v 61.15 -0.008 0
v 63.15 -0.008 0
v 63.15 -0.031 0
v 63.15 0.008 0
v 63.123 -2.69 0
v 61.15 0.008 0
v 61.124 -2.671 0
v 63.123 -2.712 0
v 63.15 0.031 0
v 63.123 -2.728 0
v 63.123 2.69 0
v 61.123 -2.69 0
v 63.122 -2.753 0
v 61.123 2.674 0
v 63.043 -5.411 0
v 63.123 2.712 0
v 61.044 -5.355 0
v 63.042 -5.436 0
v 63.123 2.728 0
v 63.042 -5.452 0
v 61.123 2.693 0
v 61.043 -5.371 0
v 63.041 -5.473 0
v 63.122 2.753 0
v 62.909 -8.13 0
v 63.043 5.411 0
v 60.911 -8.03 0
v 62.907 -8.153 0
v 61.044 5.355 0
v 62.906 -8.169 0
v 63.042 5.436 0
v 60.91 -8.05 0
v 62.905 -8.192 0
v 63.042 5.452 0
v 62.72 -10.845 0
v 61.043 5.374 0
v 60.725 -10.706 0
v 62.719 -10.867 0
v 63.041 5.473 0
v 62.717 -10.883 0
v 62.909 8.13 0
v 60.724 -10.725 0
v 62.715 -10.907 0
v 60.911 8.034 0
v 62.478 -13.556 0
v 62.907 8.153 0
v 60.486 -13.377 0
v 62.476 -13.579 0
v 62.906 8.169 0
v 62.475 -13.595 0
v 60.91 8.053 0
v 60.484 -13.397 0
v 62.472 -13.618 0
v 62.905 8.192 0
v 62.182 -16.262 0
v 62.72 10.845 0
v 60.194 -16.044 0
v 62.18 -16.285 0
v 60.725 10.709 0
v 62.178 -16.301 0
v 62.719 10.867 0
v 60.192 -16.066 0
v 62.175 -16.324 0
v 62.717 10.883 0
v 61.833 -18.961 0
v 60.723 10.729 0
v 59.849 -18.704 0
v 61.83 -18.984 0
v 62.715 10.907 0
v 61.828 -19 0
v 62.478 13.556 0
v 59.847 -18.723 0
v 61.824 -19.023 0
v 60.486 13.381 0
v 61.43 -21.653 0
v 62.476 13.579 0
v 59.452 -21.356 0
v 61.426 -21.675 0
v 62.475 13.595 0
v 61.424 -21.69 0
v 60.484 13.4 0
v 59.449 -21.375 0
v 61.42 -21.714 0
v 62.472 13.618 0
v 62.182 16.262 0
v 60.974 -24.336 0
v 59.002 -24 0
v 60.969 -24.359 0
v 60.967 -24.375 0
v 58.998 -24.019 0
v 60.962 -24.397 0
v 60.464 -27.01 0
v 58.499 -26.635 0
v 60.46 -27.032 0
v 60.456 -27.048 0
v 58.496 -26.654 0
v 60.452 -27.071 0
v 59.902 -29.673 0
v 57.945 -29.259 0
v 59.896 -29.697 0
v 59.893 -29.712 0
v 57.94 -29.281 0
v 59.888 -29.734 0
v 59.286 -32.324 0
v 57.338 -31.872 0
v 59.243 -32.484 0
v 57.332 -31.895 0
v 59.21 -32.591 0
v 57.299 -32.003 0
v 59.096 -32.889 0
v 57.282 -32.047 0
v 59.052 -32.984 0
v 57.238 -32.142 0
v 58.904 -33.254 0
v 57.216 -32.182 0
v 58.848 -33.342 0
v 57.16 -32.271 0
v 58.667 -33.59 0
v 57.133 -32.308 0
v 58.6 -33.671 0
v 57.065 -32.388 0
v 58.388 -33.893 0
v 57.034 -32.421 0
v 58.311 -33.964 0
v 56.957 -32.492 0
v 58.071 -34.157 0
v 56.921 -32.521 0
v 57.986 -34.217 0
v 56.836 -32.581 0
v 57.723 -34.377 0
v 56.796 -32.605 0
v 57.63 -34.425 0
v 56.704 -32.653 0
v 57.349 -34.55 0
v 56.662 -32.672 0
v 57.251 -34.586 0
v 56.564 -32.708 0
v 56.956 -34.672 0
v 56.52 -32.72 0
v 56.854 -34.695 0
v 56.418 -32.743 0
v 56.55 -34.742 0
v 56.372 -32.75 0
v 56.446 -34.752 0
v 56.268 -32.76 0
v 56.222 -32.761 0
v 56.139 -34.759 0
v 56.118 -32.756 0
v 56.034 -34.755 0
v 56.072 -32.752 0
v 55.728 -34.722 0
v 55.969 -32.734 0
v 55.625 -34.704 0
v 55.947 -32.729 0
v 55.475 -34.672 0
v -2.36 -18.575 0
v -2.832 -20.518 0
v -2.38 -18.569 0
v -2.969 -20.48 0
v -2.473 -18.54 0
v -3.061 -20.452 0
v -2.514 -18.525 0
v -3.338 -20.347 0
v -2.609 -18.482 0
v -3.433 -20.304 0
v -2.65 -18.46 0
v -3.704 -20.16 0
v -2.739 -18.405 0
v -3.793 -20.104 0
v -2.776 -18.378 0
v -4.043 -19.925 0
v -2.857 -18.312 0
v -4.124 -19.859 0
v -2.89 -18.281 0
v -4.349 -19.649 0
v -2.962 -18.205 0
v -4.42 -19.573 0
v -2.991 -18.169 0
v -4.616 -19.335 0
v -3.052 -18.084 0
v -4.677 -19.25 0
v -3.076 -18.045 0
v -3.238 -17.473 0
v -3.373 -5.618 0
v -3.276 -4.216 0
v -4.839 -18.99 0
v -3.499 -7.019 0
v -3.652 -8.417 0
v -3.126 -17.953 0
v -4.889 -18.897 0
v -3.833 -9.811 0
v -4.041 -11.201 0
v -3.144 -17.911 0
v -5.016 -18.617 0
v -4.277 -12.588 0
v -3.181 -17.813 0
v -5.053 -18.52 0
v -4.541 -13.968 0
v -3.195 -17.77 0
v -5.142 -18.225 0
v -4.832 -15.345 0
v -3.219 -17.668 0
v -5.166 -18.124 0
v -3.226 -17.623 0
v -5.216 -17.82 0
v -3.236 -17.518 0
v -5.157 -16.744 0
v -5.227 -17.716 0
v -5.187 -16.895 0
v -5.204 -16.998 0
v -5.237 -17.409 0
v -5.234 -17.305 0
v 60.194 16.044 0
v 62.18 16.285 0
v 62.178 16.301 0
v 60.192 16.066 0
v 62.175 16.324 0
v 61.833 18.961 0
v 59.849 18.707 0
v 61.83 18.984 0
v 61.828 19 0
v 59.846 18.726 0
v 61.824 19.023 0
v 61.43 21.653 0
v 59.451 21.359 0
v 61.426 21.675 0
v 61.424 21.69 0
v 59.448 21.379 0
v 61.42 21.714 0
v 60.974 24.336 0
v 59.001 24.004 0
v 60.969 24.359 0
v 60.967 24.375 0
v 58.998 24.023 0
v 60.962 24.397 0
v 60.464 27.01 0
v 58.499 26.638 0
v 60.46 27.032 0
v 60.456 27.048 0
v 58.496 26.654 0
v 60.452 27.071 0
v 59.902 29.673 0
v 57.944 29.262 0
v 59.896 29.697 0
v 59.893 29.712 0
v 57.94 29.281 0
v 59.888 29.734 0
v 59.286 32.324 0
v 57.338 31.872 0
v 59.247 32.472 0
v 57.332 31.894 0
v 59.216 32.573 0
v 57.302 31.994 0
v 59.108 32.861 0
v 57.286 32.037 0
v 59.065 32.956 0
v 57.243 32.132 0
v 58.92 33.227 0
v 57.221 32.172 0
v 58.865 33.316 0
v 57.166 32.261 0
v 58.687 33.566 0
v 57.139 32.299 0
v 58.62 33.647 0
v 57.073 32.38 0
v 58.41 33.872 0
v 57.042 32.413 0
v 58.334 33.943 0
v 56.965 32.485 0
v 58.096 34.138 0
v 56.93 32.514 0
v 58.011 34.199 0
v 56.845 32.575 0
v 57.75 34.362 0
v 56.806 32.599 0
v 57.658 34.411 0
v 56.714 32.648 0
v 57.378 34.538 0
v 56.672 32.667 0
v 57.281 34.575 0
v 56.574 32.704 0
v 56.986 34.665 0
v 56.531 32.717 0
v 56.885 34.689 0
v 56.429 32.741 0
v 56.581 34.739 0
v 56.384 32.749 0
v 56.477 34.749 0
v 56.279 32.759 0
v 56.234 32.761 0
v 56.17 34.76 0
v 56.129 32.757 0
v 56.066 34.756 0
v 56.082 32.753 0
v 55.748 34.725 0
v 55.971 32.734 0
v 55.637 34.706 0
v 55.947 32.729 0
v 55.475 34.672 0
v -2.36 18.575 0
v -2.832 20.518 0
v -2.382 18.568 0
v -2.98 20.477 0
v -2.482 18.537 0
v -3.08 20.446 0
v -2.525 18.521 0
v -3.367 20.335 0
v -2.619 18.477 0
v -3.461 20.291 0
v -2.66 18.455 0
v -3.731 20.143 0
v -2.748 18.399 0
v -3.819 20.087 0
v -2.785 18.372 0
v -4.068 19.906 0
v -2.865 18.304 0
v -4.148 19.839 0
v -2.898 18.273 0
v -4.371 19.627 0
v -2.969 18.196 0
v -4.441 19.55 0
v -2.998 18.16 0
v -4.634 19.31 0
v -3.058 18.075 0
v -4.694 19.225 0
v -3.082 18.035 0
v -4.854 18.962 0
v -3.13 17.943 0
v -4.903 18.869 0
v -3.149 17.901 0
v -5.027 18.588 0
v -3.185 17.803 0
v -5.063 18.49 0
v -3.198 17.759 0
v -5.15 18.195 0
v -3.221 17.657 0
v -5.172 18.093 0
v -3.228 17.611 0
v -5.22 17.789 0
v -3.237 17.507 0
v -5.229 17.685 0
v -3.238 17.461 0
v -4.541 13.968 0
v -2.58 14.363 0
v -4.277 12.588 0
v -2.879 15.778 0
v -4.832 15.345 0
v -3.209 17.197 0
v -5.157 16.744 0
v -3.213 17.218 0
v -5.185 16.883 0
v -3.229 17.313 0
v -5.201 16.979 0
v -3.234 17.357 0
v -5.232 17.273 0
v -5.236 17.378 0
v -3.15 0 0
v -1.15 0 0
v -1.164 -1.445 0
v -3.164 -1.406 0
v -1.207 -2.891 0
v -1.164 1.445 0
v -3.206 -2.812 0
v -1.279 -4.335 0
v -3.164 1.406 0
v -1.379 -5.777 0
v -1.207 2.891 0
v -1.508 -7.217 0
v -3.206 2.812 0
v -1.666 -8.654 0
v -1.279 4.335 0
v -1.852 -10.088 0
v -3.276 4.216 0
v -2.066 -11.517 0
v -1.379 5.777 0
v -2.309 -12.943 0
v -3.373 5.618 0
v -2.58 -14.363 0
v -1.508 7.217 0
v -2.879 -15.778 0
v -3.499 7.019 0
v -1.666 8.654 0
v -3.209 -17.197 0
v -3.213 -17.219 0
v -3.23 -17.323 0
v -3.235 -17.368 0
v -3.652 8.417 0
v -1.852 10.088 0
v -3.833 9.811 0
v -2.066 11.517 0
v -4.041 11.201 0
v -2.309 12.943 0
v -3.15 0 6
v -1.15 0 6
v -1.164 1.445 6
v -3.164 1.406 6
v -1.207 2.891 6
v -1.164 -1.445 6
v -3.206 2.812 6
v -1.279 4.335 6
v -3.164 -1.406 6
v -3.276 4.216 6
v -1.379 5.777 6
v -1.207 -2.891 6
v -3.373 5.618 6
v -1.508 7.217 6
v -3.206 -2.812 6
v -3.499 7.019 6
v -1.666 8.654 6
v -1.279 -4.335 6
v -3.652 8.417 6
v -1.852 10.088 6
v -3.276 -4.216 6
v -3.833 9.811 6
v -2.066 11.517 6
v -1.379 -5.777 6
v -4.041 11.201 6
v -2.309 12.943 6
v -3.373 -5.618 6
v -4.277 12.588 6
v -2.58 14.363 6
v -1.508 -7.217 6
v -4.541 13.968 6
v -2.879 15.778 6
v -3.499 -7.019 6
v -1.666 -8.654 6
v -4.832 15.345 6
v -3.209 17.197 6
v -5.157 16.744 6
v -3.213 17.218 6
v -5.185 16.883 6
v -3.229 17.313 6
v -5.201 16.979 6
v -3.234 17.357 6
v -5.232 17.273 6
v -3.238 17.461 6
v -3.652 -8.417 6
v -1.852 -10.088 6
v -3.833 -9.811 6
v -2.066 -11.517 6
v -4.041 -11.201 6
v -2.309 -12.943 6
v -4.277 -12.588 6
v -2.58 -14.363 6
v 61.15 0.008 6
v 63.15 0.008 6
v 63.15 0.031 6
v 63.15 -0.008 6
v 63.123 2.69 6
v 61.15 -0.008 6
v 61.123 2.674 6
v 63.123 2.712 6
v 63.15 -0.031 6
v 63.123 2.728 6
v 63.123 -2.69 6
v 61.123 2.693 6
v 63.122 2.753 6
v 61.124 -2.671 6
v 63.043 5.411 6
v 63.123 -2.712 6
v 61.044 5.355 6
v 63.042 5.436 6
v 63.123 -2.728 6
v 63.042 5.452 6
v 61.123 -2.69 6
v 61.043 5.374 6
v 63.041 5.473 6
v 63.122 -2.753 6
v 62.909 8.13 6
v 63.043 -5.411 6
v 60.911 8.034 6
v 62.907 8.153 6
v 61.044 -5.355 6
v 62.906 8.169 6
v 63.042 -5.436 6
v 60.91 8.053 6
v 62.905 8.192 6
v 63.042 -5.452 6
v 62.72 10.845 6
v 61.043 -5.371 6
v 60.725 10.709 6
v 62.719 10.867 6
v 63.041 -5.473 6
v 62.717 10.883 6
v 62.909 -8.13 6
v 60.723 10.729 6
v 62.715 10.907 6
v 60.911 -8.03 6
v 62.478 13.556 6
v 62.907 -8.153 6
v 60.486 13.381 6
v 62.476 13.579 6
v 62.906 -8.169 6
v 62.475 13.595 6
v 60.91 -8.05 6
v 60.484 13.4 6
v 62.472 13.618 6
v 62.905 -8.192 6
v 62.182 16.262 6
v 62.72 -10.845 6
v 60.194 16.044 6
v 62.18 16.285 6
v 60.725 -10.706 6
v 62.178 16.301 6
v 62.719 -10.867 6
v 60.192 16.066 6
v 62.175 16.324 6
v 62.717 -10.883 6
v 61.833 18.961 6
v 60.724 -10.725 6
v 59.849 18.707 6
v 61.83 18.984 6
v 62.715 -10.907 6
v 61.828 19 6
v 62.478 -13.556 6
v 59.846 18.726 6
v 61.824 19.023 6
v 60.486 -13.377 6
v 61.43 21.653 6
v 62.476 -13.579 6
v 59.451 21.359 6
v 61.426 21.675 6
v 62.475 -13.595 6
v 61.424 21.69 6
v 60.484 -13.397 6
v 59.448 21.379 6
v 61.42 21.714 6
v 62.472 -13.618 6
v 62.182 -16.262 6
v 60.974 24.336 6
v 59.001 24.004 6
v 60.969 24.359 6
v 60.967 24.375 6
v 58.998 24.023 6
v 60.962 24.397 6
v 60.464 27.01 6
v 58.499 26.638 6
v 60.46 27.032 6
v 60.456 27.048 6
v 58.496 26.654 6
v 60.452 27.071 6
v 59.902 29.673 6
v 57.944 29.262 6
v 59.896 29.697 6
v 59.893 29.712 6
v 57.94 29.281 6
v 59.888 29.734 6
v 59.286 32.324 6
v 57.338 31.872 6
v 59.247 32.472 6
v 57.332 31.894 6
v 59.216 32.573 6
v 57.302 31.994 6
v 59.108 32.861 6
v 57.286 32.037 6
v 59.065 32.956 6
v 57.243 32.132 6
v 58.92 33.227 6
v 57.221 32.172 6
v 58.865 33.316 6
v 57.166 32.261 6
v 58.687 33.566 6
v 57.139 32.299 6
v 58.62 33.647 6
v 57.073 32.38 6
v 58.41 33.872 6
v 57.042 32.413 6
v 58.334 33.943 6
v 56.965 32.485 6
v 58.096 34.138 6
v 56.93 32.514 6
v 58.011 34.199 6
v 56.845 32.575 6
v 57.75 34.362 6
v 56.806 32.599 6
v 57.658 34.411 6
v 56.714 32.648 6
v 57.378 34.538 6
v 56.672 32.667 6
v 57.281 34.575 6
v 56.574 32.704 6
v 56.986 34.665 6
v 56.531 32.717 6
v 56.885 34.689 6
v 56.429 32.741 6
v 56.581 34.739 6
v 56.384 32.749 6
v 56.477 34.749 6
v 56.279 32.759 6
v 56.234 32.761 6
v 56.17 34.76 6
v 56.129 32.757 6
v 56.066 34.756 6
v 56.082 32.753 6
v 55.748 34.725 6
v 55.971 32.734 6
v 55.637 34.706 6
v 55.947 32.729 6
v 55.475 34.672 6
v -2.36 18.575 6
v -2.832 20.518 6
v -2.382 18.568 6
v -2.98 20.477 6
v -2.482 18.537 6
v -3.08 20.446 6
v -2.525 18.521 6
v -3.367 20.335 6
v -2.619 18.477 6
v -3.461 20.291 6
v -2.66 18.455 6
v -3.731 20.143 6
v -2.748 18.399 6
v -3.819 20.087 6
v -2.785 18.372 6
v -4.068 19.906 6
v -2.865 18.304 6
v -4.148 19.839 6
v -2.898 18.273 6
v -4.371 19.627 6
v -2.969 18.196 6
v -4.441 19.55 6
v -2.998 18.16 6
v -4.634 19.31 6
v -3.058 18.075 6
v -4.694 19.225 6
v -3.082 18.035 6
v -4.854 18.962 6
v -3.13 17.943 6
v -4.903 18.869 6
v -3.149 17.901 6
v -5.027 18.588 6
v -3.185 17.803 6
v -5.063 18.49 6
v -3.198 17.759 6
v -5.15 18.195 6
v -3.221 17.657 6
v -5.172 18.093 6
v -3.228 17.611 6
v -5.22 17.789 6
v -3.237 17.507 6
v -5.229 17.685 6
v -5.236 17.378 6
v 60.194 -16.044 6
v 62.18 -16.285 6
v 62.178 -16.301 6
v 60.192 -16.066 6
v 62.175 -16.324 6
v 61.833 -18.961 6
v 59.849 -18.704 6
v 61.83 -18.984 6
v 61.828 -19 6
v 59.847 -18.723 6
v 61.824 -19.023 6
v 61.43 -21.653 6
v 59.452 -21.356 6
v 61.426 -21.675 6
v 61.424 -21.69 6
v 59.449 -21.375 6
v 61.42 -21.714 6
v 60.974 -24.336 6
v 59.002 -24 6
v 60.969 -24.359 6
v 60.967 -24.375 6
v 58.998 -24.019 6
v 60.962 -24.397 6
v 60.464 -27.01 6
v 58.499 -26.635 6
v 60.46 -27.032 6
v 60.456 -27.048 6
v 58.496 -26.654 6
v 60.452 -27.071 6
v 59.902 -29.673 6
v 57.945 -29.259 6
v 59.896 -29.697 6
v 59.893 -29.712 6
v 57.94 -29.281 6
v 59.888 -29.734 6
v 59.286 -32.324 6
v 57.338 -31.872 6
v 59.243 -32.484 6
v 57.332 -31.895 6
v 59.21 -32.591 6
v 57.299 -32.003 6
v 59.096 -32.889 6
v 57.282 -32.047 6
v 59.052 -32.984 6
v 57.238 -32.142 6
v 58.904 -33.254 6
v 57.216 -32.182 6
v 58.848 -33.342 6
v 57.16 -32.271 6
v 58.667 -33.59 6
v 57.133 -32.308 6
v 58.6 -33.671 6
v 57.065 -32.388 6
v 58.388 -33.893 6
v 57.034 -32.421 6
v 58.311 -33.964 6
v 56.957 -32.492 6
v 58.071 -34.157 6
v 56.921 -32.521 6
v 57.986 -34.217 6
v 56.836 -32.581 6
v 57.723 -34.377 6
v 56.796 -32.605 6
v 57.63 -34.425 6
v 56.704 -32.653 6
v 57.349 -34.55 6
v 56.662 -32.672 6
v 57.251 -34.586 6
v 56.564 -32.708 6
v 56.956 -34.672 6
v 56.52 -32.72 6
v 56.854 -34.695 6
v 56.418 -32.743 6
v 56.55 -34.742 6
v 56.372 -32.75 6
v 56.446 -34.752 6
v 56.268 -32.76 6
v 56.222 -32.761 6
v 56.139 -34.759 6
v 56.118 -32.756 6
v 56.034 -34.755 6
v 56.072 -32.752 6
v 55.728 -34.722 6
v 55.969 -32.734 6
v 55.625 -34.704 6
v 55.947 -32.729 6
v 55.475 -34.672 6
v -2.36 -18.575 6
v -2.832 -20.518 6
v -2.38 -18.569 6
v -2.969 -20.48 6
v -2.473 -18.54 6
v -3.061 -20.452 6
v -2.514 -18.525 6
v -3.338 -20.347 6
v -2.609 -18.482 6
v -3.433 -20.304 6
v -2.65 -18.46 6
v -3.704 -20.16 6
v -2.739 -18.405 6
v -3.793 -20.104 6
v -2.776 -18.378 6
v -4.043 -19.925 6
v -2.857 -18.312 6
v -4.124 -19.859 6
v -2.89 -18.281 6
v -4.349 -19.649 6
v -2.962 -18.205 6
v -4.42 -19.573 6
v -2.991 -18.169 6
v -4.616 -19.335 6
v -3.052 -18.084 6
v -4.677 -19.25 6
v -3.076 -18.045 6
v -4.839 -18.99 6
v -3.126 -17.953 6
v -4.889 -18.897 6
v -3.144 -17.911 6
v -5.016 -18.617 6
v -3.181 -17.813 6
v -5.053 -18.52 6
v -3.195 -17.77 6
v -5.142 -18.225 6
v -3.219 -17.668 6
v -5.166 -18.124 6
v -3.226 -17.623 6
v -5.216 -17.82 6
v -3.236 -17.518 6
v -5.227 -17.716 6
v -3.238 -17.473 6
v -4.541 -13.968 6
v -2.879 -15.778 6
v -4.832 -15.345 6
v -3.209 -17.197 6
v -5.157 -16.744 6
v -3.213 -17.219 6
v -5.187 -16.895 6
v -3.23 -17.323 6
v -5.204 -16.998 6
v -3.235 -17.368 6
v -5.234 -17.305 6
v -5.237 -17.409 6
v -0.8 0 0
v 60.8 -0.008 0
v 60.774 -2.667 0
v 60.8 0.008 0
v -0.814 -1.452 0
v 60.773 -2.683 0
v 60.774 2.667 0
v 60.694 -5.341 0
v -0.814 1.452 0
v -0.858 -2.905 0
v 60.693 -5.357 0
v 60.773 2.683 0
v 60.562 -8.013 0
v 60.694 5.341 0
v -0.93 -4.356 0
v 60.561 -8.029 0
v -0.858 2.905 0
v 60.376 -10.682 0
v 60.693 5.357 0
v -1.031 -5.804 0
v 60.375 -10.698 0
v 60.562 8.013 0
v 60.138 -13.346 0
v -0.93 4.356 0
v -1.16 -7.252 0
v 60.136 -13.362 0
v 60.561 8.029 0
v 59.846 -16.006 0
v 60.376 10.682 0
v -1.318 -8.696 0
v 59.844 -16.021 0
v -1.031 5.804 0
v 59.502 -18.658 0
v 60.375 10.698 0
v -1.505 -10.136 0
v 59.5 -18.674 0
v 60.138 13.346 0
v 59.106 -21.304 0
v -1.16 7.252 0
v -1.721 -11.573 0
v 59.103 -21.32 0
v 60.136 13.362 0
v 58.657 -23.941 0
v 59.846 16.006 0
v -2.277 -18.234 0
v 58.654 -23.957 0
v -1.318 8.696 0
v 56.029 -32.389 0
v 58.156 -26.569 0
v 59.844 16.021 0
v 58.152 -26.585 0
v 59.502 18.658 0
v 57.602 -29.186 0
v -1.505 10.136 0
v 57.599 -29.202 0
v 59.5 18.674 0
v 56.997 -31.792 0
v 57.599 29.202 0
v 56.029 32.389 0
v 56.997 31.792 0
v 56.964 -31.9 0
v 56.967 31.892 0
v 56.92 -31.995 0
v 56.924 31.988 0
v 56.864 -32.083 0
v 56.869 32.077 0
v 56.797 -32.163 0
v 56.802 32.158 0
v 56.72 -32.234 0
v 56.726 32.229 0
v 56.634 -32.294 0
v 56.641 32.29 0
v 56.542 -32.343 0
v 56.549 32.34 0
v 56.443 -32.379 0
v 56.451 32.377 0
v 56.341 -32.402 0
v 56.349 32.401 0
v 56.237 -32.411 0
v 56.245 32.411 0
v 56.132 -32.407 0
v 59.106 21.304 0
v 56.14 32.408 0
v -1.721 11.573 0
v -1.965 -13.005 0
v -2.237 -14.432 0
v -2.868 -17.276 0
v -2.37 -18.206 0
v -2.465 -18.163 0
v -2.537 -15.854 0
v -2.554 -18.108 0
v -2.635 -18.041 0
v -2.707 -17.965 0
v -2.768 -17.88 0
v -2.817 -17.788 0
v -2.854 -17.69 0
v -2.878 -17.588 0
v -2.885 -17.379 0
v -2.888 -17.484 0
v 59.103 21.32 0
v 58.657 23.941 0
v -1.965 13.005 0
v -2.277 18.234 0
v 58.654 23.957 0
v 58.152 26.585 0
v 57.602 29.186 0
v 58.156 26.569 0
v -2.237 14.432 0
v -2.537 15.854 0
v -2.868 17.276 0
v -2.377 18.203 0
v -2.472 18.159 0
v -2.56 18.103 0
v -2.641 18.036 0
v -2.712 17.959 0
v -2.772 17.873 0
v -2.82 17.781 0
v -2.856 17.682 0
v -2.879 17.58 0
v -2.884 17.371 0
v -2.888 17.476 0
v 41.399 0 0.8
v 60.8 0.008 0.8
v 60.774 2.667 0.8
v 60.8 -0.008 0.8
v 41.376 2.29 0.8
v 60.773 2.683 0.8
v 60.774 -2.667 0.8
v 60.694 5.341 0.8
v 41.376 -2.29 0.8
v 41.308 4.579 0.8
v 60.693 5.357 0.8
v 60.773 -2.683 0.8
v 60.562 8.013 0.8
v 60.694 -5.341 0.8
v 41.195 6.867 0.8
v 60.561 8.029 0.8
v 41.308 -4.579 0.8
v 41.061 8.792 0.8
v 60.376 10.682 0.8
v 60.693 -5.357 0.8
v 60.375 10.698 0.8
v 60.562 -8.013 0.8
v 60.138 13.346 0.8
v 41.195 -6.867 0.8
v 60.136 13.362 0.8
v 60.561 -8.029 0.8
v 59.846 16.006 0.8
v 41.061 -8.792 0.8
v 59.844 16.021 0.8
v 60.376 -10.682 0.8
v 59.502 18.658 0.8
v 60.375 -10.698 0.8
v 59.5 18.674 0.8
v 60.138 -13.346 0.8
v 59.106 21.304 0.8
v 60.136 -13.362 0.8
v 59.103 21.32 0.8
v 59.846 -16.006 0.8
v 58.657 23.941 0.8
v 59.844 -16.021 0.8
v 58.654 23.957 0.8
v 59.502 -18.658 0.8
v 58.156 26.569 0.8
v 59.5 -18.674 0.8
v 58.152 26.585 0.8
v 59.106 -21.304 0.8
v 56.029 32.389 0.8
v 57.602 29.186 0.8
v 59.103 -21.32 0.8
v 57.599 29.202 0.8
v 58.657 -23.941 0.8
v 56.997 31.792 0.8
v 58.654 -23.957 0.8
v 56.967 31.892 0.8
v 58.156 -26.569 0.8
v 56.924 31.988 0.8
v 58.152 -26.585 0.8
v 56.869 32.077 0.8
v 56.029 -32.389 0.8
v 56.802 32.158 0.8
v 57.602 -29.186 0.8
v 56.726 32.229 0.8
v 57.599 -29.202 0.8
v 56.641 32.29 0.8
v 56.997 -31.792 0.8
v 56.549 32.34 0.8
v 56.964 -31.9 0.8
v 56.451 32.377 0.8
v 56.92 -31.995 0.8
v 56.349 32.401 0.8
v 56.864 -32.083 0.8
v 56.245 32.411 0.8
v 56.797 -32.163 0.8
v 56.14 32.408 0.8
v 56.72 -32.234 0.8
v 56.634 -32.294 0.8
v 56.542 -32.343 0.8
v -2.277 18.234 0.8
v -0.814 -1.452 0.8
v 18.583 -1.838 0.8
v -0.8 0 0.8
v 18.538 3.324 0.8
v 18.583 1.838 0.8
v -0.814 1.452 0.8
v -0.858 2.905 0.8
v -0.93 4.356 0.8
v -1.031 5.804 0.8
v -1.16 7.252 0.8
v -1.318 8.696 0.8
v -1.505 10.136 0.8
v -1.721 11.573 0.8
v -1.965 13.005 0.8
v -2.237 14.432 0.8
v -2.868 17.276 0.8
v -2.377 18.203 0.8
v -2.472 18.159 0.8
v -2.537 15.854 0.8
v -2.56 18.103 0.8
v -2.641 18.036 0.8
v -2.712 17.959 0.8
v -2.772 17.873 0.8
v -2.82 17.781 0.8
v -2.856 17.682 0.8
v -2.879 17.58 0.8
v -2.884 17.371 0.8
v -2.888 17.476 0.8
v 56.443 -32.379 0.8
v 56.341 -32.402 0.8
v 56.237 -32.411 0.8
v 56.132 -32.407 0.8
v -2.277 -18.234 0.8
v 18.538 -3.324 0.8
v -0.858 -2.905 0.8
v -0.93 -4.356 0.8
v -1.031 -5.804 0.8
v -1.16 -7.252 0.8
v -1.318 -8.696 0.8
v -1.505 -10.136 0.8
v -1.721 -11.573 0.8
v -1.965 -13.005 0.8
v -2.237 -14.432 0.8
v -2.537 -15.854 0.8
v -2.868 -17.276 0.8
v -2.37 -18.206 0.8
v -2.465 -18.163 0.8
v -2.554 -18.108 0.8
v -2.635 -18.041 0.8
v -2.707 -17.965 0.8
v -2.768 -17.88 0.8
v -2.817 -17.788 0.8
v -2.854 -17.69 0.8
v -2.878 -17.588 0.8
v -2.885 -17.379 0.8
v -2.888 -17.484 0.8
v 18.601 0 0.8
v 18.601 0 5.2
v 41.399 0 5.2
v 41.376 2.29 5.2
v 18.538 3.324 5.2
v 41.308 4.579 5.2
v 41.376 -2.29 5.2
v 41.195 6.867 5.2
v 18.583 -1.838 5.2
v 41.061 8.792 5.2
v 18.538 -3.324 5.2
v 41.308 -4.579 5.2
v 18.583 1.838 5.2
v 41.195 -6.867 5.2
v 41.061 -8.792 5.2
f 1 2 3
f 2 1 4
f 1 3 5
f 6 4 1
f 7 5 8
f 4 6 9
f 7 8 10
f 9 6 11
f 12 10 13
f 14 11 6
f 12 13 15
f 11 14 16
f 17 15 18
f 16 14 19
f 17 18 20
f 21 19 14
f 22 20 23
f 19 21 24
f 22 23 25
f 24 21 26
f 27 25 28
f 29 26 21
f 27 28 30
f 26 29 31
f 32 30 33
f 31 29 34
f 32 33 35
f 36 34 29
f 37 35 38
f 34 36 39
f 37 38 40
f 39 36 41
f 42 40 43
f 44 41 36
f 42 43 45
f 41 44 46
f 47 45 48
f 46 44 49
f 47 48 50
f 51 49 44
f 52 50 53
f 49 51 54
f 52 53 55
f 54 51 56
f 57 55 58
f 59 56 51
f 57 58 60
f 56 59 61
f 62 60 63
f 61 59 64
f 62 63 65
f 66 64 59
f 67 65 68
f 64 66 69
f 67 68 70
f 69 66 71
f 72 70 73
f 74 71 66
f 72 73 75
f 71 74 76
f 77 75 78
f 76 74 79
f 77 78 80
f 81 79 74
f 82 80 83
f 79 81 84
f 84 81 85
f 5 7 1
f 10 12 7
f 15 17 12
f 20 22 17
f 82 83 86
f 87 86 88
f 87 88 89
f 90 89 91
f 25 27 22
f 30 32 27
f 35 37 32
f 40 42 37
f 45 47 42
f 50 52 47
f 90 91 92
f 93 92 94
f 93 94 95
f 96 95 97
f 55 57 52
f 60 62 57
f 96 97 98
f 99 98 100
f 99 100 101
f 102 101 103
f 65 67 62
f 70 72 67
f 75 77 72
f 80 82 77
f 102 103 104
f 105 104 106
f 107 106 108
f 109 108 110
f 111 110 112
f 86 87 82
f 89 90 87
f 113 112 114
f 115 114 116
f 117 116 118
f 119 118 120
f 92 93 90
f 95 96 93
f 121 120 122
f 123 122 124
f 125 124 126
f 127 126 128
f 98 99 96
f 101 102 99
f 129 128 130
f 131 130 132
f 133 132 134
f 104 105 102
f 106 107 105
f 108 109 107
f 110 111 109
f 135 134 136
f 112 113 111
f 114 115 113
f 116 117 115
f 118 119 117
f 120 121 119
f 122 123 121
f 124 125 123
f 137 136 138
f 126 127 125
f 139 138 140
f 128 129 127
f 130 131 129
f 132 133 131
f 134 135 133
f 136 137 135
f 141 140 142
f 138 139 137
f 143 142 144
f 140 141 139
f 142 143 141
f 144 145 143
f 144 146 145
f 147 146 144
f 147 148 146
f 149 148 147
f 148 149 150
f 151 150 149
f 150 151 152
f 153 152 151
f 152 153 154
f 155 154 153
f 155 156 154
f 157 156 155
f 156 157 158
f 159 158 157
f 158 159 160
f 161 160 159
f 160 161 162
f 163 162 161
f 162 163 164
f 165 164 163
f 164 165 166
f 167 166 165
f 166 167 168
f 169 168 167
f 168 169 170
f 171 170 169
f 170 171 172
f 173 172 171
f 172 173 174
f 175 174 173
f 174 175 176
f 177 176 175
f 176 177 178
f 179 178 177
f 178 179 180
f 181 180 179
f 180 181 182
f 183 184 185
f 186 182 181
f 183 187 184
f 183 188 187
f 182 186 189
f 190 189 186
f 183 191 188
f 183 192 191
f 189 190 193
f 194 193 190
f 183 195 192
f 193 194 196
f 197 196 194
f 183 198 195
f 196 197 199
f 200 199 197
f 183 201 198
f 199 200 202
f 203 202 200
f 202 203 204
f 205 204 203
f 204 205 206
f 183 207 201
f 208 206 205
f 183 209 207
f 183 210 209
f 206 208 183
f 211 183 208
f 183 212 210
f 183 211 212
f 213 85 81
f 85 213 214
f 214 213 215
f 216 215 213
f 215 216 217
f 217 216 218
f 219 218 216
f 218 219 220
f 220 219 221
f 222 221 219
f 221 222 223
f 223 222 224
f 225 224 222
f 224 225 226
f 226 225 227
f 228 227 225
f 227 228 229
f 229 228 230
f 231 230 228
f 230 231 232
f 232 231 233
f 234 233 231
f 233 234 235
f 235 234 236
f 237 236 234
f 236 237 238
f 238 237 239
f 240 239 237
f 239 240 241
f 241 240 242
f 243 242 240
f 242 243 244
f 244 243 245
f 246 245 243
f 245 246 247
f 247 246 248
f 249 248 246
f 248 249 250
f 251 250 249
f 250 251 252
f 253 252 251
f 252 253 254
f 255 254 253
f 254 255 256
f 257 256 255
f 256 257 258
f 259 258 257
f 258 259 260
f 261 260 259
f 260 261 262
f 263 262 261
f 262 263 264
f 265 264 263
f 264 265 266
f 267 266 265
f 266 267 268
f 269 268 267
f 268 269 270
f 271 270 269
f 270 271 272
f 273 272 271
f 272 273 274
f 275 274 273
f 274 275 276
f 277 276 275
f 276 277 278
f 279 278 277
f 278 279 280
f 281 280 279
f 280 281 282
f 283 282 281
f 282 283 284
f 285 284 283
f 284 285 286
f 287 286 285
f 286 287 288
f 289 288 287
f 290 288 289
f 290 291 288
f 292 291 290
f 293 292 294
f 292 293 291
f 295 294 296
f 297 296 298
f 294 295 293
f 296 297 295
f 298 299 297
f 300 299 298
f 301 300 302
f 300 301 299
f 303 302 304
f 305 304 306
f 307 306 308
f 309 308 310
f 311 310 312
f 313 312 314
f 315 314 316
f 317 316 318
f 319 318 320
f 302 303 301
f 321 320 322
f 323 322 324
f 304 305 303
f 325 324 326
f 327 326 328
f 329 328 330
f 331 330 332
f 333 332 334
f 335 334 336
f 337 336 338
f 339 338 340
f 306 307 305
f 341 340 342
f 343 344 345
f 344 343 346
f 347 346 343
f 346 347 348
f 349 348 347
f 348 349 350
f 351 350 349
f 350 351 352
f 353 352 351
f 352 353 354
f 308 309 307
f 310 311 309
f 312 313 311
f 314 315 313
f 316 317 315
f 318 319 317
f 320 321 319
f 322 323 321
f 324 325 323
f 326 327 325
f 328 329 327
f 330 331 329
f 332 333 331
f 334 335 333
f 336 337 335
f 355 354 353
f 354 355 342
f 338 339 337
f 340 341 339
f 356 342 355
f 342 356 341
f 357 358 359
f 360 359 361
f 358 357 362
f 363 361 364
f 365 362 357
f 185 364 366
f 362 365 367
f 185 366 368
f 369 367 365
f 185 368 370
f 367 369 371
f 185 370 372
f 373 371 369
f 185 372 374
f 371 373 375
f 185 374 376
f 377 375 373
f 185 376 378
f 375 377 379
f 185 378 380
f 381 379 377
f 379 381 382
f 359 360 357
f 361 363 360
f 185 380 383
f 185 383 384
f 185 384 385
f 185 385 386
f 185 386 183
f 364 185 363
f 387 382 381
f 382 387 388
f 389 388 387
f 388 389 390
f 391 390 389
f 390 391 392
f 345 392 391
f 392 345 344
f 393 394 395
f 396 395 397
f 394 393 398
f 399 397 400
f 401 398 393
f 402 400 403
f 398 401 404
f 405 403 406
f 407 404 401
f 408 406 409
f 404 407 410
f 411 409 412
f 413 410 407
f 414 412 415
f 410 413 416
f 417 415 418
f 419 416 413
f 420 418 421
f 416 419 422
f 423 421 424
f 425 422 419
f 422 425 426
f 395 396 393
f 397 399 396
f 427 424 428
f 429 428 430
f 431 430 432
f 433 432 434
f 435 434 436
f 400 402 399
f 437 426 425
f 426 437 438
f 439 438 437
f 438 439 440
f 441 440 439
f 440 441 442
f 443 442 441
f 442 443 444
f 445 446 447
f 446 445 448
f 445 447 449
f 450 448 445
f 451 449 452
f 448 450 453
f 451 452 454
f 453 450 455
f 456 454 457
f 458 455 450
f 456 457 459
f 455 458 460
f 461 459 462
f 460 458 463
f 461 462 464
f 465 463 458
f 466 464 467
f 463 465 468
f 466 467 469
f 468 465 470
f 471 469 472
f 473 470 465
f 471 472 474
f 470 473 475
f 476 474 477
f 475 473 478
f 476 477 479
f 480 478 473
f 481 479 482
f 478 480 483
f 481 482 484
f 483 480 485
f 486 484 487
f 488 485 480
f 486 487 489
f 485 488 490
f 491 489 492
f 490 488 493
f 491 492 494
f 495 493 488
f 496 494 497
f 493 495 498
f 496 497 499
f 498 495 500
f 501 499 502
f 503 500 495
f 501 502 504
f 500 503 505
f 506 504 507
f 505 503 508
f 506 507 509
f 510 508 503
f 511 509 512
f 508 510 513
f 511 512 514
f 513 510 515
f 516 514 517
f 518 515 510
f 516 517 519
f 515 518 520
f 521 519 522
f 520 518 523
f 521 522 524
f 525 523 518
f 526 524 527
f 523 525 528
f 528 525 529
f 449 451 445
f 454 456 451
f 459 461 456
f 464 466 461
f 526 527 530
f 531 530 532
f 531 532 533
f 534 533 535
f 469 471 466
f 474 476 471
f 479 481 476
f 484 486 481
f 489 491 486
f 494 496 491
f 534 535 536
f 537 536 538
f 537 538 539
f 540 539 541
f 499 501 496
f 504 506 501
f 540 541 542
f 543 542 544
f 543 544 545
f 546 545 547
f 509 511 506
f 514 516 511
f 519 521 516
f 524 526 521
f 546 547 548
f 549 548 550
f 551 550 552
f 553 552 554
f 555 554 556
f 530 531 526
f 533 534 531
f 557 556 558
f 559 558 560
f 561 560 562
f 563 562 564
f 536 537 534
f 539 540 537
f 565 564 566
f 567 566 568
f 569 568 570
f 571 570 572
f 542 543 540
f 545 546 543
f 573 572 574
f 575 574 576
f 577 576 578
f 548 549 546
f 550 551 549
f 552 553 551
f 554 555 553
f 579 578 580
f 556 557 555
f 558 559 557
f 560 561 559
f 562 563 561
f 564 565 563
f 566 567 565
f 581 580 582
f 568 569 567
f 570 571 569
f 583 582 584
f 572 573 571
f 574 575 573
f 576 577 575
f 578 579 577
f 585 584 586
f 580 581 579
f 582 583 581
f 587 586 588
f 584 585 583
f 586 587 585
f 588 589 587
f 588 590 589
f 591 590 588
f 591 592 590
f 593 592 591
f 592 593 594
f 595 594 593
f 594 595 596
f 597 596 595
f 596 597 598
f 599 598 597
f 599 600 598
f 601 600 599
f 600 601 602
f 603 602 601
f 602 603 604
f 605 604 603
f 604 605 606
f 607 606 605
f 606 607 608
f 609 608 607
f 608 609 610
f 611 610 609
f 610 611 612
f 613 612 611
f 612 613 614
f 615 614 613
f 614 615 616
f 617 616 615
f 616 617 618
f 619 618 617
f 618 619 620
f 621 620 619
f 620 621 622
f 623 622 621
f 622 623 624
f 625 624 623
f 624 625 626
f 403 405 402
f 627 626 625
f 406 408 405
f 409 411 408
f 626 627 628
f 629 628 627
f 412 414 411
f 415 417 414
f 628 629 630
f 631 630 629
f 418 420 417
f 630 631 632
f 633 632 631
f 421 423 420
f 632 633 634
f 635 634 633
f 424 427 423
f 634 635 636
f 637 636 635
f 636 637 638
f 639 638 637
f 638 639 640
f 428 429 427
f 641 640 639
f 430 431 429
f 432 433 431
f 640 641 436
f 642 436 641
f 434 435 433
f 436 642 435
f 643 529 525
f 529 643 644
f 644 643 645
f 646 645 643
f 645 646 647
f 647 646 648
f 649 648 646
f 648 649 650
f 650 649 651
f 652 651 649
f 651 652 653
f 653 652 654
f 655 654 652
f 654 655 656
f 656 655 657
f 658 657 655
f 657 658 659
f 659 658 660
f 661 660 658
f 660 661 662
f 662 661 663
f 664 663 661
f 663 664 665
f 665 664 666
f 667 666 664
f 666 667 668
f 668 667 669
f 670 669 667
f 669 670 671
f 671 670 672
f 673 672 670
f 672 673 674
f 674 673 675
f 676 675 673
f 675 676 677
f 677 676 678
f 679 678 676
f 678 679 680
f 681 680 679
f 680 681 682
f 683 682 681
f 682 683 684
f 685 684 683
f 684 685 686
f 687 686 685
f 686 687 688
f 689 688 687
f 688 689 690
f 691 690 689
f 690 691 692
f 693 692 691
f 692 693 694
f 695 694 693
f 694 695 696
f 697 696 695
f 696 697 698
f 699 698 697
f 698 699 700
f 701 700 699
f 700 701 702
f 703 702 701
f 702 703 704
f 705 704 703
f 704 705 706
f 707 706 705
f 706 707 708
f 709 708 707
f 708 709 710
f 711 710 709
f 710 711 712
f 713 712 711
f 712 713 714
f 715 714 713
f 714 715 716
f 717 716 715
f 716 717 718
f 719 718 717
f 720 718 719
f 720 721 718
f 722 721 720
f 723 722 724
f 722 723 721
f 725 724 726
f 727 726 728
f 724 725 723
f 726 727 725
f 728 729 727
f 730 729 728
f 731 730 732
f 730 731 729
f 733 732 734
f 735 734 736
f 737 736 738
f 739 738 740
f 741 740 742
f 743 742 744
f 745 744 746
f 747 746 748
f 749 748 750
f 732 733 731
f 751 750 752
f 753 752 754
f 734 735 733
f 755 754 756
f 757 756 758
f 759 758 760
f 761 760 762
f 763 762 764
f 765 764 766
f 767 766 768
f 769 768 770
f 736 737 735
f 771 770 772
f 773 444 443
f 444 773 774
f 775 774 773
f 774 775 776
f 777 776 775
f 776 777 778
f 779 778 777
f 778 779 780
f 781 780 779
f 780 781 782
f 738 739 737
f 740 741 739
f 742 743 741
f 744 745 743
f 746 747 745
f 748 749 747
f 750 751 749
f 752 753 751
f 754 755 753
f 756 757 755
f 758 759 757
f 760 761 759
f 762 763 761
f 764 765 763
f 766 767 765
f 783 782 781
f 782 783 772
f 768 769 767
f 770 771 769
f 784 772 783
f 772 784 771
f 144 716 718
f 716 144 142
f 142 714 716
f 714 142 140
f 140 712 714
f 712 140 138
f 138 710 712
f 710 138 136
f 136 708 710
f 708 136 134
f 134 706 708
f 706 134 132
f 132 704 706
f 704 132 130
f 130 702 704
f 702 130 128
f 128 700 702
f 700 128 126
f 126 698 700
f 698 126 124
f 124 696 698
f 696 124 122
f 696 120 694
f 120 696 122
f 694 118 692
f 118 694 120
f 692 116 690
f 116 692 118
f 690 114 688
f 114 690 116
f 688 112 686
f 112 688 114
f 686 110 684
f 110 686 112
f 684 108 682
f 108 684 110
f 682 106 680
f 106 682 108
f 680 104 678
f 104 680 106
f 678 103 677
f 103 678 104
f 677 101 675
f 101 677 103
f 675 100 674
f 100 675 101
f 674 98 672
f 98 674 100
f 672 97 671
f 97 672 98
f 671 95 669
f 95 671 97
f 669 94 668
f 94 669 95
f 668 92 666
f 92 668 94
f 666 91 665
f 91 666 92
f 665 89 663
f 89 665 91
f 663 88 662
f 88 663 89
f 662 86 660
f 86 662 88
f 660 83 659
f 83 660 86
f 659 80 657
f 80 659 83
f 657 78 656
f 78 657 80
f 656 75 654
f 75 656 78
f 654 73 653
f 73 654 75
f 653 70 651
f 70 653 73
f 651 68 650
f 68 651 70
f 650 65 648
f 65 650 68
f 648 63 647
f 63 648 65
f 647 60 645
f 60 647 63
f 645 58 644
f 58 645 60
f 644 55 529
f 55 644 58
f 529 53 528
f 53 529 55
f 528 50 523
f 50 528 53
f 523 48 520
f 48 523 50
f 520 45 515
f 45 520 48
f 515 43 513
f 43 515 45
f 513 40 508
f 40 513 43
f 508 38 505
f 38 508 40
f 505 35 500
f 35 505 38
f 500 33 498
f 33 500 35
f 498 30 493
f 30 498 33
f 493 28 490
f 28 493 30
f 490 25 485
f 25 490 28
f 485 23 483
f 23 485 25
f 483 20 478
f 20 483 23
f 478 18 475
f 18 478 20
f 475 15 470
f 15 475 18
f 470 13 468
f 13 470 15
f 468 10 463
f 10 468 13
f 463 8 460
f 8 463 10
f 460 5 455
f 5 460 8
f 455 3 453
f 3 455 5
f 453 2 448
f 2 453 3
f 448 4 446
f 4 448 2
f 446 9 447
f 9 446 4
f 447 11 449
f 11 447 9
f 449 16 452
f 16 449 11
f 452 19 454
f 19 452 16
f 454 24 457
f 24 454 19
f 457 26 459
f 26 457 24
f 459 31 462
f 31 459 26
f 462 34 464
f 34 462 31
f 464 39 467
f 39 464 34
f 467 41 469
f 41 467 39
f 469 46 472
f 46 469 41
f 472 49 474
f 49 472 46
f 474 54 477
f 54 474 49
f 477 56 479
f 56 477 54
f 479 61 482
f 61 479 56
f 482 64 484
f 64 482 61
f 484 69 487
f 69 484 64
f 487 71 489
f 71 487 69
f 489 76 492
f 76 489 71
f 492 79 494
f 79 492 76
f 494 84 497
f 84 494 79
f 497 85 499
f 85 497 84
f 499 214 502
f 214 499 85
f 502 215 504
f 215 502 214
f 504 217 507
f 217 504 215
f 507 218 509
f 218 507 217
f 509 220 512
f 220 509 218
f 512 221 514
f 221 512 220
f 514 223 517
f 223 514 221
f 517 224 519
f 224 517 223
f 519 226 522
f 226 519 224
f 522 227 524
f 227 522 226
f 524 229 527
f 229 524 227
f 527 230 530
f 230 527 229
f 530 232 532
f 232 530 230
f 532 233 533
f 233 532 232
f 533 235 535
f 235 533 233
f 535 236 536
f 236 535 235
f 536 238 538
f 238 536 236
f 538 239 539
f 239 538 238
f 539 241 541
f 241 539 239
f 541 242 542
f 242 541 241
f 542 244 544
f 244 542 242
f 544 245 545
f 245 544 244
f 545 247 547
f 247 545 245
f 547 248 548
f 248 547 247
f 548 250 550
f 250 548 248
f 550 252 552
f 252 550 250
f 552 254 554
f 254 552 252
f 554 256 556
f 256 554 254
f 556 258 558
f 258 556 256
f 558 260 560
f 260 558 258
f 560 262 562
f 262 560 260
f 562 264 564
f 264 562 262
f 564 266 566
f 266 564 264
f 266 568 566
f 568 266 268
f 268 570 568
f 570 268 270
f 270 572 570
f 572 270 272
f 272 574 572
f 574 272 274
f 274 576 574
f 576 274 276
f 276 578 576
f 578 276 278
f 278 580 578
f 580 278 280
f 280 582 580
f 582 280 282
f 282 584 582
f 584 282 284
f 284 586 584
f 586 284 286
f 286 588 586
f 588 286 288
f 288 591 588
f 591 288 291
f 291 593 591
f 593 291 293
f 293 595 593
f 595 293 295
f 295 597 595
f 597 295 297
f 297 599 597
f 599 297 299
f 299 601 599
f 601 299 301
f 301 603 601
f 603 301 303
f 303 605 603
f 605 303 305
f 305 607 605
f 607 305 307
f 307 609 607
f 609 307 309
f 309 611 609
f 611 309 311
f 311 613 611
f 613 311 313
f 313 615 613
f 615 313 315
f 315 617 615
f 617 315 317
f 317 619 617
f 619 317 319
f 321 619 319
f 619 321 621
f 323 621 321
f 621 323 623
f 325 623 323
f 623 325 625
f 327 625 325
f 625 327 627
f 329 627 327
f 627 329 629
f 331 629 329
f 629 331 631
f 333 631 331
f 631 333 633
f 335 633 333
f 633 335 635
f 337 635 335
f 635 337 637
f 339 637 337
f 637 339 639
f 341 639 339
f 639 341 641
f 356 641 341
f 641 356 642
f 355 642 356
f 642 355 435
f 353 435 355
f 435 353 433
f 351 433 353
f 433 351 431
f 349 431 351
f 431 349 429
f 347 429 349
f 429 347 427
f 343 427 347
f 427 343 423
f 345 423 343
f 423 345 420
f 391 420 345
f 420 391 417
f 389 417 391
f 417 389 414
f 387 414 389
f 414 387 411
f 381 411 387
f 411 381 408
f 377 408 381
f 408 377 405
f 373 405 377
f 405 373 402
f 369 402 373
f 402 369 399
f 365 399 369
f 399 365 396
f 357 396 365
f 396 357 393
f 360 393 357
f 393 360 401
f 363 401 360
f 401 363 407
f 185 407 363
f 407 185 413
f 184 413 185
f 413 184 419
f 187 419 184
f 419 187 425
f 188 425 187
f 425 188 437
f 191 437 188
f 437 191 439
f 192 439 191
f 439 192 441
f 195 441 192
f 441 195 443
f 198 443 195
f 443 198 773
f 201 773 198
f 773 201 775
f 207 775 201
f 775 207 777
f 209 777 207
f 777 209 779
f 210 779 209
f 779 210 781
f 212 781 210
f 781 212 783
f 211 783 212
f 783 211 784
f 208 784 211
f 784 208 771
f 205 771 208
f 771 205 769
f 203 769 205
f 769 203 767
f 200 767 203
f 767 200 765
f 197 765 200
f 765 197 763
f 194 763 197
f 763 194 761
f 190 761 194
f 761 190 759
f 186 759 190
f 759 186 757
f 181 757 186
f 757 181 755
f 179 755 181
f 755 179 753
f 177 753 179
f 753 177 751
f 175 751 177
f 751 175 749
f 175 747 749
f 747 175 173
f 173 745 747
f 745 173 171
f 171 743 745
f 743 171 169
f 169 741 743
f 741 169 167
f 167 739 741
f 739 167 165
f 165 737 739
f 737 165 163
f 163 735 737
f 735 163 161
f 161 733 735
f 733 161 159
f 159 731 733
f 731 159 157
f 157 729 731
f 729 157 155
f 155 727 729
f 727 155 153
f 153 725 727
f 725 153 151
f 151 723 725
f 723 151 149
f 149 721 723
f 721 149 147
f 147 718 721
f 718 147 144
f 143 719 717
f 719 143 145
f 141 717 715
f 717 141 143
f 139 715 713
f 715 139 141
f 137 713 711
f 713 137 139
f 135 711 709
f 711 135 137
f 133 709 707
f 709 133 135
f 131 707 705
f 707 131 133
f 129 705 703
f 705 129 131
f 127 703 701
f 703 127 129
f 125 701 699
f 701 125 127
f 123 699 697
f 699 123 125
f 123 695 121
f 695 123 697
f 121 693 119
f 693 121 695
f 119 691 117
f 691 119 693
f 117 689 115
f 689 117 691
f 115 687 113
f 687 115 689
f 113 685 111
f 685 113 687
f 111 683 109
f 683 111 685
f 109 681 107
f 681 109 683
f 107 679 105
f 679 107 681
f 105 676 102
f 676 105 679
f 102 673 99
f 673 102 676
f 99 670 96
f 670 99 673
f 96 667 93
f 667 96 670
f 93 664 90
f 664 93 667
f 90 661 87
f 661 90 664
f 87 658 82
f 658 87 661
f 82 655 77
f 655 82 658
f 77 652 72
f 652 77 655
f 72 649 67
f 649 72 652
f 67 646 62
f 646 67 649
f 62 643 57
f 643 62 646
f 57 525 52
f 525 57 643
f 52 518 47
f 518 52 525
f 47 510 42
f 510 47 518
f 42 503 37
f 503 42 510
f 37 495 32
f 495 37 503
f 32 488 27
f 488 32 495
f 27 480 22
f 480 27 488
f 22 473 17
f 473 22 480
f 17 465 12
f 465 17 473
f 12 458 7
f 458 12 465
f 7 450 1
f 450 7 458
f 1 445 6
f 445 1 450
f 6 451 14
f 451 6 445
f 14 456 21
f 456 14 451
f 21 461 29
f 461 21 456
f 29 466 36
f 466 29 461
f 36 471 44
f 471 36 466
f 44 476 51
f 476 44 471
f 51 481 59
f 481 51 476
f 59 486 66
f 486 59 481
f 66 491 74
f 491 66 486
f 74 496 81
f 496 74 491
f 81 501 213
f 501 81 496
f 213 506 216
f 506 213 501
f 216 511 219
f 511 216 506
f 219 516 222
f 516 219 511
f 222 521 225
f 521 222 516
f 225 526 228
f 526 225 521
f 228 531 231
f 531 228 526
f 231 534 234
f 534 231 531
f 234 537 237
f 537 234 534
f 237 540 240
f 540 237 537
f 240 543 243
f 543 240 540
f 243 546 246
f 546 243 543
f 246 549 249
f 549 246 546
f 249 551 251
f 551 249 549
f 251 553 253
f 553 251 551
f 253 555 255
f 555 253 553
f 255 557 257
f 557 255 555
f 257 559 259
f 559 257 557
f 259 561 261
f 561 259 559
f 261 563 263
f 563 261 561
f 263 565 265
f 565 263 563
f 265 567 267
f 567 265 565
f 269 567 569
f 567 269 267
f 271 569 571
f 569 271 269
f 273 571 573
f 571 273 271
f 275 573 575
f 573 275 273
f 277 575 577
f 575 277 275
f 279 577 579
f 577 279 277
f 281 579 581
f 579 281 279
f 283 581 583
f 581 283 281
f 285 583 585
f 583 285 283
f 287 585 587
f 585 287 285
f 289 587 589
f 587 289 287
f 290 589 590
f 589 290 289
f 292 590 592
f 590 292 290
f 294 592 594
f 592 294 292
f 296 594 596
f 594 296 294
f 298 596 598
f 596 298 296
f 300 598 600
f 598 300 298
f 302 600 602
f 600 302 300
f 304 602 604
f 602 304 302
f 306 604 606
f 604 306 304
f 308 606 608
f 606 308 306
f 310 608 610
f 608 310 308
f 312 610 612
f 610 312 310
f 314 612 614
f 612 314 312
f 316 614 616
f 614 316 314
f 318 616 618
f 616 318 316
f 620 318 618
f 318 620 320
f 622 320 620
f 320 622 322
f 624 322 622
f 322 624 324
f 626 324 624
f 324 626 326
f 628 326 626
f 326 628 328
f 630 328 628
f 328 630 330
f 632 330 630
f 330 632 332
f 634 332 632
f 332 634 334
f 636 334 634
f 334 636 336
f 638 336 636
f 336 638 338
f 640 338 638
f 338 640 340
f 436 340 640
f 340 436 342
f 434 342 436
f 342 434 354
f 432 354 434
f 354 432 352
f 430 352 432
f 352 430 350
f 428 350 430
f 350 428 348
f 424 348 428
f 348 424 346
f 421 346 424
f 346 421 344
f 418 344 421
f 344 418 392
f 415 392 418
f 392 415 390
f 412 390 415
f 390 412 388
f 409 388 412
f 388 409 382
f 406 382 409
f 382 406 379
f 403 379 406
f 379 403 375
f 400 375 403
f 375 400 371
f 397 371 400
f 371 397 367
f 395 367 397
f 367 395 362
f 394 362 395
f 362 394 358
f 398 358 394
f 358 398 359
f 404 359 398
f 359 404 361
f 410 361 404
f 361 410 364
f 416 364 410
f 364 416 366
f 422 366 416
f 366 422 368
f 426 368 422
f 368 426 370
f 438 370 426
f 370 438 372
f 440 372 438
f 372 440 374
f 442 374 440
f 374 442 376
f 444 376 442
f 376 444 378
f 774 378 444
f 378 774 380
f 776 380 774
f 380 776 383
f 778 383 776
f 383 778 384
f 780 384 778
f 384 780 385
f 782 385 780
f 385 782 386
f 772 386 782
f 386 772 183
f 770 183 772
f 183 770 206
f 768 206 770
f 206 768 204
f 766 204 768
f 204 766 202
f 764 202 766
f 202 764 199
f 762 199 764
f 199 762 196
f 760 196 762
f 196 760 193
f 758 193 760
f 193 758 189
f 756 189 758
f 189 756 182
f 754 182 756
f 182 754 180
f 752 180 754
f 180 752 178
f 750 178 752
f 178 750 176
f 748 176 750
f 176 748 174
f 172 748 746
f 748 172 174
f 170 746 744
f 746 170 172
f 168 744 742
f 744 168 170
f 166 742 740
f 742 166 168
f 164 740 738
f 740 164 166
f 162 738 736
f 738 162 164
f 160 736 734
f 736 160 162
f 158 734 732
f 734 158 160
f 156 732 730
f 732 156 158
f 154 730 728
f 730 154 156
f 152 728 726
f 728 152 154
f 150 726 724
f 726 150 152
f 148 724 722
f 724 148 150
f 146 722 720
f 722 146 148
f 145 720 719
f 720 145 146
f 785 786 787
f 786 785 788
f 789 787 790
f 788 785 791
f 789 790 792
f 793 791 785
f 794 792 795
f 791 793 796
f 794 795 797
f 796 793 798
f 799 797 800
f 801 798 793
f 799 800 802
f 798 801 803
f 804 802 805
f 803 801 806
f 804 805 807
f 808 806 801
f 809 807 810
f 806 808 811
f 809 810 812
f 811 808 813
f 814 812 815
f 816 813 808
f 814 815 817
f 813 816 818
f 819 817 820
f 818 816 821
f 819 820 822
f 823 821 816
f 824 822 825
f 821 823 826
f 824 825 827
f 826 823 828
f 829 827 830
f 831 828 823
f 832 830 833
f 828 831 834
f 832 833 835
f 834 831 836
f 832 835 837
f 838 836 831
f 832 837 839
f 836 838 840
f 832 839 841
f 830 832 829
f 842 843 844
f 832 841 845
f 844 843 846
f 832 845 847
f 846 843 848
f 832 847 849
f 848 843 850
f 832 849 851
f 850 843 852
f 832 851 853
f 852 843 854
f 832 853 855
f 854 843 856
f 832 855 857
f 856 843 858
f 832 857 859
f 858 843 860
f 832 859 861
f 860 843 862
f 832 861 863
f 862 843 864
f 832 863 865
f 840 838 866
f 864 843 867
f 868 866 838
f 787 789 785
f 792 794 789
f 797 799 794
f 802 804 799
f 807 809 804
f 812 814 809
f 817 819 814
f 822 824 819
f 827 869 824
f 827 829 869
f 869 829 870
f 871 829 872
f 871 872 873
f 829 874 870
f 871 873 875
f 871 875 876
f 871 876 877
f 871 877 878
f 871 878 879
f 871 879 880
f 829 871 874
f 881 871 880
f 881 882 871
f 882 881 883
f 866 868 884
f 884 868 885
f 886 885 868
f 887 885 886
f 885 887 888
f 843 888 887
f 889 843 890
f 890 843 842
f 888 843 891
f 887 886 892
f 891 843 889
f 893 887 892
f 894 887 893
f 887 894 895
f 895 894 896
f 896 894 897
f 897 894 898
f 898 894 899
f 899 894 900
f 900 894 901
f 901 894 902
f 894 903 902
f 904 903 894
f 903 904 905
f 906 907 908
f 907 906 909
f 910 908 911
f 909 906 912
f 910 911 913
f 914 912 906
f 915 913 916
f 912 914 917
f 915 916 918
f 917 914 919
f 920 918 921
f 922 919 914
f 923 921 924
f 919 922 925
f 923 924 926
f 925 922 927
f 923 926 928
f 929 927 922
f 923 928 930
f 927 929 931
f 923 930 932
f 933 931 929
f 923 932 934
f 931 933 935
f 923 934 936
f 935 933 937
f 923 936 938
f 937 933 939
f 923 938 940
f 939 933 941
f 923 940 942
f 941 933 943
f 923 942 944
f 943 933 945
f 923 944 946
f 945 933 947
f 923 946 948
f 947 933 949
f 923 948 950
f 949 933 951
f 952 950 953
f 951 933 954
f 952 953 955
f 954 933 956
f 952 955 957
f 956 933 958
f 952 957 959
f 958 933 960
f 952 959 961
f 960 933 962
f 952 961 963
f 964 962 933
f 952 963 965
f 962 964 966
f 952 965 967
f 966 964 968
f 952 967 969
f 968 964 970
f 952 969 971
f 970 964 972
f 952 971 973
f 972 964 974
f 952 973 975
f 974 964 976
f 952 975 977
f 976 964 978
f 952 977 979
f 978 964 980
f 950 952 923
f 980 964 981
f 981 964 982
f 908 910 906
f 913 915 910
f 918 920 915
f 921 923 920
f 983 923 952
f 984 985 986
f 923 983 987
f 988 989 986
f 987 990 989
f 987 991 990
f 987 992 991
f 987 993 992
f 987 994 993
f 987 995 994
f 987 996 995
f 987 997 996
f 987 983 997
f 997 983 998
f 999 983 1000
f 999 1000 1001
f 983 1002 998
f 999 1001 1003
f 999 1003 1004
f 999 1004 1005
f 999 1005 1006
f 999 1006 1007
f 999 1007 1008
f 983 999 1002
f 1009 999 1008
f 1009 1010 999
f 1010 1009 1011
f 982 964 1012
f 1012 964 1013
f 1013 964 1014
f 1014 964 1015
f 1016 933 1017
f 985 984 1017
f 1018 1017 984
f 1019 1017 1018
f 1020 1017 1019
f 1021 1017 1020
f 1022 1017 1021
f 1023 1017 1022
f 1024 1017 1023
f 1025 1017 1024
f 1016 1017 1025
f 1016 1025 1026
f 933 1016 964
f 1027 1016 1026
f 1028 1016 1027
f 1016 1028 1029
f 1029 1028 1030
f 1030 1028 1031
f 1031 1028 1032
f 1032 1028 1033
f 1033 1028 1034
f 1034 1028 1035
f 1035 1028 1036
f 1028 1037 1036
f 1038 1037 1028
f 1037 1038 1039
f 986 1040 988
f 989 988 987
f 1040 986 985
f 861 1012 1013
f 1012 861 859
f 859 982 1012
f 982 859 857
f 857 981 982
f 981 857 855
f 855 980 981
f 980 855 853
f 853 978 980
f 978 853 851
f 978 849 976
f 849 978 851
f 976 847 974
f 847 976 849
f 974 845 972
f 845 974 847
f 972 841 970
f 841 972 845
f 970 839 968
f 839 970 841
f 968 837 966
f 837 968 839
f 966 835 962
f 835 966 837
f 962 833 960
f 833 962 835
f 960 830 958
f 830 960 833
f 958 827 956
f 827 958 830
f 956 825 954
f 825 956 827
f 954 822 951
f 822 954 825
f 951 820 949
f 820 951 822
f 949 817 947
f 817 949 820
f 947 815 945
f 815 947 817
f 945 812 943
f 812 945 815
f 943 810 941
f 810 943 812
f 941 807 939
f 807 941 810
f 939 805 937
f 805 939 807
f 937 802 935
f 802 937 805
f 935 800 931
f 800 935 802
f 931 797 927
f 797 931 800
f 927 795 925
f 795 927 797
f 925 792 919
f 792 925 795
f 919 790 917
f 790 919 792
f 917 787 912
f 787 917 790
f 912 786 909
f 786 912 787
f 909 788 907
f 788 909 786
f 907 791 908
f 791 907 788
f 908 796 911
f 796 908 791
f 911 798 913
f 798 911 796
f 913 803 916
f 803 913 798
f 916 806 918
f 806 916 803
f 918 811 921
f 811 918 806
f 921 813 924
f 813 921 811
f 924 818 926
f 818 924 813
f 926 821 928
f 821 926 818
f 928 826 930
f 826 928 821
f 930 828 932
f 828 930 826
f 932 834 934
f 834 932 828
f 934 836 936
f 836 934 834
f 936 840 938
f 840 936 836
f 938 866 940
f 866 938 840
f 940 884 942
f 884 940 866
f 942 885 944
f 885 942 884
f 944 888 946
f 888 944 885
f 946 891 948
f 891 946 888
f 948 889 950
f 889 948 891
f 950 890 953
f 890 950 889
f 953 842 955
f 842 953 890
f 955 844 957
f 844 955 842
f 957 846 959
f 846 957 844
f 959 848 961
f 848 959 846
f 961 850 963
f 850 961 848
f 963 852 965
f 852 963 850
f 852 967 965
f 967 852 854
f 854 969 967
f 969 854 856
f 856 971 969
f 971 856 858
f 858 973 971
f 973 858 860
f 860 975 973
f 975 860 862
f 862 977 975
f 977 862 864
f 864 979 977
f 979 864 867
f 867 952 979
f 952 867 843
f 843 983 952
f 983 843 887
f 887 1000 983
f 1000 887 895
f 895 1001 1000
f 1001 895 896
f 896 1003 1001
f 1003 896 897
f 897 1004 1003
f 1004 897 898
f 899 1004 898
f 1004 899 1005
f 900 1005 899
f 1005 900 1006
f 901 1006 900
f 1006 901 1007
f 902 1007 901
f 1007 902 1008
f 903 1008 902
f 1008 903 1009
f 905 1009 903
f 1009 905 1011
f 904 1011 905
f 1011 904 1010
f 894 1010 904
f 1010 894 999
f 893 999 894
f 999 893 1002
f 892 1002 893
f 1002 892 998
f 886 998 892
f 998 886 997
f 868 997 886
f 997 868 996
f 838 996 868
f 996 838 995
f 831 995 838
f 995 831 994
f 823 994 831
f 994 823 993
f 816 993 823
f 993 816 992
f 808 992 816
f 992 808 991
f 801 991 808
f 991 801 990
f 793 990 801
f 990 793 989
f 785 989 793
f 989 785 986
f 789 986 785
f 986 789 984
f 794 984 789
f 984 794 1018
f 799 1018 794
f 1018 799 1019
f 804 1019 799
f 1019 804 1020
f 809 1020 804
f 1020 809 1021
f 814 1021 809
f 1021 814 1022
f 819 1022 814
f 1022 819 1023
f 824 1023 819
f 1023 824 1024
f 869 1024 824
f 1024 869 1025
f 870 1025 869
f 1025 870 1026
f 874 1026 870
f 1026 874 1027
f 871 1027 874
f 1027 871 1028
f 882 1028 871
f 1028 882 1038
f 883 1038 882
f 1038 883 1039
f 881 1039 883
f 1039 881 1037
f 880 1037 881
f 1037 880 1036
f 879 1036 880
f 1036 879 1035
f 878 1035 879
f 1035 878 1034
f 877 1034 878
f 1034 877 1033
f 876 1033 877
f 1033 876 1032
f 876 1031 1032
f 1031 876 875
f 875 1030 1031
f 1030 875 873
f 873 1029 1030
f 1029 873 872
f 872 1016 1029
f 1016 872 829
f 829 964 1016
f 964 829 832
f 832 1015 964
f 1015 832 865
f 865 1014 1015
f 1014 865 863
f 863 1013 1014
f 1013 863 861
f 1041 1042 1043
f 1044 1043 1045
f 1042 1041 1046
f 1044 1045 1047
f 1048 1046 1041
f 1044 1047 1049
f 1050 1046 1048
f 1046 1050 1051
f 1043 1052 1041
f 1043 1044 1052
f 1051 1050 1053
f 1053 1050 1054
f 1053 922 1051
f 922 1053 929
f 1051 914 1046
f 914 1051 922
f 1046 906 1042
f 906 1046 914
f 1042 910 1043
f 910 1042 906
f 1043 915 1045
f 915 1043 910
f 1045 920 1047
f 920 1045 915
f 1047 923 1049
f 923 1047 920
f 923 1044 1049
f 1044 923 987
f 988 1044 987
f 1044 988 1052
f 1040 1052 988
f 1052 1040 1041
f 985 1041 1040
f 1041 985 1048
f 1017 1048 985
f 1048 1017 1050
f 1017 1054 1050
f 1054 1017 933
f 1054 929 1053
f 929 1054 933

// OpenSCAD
// Gen-DM — fit coupon (bay part): O20/O5 THROUGH pockets at carrier thickness (test on a steel offcut), 608 seat,
// D-flat bore, gap shim, and one bobbin-bay slice (bobbin footprint + bay_clear) to test former fit.
include <parameters.scad>;
$fn = 48;
// D-flat keyed bore: flat faces +X (angle 0 = magnet pocket 0 = index notch)
module dflat_bore(h) {
    intersection() {
        cylinder(d=shaft_bore, h=h);
        translate([-shaft_bore, -shaft_bore, 0]) cube([shaft_bore + dflat_x, 2*shaft_bore, h]);
    }
}
module sector_2d(r_in, r_out, ang) {
    polygon([
        for (a = [-ang/2 : ang/24 : ang/2]) [r_in*cos(a), r_in*sin(a)],
        for (a = [ang/2 : -ang/24 : -ang/2]) [r_out*cos(a), r_out*sin(a)]
    ]);
}
module footprint_2d() { offset(r=wall) sector_2d(coil_id_r, coil_od_r, span_deg); }
module hub_2d()       { offset(delta=-coil_core_inset) sector_2d(coil_id_r, coil_od_r, span_deg); }

// bay slice at FULL stator thickness with one bobbin BASE printed IN PLACE inside it (bay_clear gap): this is the
// print-in-place test for the one-plate stator. After printing, the base must pop out with finger pressure; if it is fused,
// print coil_former.stl separately (print-packs/parts/) instead of using the in-place bases.
translate([-coil_id_r, 0, 0]) {
    difference() {
        linear_extrude(stator_thick) offset(r=bay_clear + 2) footprint_2d();
        translate([0, 0, -0.1]) linear_extrude(stator_thick + 0.2) offset(r=bay_clear) footprint_2d();
    }
    union() {
        linear_extrude(flange_t) footprint_2d();
        translate([0, 0, flange_t - 0.01]) linear_extrude(former_web + 0.01) hub_2d();
    }
}
